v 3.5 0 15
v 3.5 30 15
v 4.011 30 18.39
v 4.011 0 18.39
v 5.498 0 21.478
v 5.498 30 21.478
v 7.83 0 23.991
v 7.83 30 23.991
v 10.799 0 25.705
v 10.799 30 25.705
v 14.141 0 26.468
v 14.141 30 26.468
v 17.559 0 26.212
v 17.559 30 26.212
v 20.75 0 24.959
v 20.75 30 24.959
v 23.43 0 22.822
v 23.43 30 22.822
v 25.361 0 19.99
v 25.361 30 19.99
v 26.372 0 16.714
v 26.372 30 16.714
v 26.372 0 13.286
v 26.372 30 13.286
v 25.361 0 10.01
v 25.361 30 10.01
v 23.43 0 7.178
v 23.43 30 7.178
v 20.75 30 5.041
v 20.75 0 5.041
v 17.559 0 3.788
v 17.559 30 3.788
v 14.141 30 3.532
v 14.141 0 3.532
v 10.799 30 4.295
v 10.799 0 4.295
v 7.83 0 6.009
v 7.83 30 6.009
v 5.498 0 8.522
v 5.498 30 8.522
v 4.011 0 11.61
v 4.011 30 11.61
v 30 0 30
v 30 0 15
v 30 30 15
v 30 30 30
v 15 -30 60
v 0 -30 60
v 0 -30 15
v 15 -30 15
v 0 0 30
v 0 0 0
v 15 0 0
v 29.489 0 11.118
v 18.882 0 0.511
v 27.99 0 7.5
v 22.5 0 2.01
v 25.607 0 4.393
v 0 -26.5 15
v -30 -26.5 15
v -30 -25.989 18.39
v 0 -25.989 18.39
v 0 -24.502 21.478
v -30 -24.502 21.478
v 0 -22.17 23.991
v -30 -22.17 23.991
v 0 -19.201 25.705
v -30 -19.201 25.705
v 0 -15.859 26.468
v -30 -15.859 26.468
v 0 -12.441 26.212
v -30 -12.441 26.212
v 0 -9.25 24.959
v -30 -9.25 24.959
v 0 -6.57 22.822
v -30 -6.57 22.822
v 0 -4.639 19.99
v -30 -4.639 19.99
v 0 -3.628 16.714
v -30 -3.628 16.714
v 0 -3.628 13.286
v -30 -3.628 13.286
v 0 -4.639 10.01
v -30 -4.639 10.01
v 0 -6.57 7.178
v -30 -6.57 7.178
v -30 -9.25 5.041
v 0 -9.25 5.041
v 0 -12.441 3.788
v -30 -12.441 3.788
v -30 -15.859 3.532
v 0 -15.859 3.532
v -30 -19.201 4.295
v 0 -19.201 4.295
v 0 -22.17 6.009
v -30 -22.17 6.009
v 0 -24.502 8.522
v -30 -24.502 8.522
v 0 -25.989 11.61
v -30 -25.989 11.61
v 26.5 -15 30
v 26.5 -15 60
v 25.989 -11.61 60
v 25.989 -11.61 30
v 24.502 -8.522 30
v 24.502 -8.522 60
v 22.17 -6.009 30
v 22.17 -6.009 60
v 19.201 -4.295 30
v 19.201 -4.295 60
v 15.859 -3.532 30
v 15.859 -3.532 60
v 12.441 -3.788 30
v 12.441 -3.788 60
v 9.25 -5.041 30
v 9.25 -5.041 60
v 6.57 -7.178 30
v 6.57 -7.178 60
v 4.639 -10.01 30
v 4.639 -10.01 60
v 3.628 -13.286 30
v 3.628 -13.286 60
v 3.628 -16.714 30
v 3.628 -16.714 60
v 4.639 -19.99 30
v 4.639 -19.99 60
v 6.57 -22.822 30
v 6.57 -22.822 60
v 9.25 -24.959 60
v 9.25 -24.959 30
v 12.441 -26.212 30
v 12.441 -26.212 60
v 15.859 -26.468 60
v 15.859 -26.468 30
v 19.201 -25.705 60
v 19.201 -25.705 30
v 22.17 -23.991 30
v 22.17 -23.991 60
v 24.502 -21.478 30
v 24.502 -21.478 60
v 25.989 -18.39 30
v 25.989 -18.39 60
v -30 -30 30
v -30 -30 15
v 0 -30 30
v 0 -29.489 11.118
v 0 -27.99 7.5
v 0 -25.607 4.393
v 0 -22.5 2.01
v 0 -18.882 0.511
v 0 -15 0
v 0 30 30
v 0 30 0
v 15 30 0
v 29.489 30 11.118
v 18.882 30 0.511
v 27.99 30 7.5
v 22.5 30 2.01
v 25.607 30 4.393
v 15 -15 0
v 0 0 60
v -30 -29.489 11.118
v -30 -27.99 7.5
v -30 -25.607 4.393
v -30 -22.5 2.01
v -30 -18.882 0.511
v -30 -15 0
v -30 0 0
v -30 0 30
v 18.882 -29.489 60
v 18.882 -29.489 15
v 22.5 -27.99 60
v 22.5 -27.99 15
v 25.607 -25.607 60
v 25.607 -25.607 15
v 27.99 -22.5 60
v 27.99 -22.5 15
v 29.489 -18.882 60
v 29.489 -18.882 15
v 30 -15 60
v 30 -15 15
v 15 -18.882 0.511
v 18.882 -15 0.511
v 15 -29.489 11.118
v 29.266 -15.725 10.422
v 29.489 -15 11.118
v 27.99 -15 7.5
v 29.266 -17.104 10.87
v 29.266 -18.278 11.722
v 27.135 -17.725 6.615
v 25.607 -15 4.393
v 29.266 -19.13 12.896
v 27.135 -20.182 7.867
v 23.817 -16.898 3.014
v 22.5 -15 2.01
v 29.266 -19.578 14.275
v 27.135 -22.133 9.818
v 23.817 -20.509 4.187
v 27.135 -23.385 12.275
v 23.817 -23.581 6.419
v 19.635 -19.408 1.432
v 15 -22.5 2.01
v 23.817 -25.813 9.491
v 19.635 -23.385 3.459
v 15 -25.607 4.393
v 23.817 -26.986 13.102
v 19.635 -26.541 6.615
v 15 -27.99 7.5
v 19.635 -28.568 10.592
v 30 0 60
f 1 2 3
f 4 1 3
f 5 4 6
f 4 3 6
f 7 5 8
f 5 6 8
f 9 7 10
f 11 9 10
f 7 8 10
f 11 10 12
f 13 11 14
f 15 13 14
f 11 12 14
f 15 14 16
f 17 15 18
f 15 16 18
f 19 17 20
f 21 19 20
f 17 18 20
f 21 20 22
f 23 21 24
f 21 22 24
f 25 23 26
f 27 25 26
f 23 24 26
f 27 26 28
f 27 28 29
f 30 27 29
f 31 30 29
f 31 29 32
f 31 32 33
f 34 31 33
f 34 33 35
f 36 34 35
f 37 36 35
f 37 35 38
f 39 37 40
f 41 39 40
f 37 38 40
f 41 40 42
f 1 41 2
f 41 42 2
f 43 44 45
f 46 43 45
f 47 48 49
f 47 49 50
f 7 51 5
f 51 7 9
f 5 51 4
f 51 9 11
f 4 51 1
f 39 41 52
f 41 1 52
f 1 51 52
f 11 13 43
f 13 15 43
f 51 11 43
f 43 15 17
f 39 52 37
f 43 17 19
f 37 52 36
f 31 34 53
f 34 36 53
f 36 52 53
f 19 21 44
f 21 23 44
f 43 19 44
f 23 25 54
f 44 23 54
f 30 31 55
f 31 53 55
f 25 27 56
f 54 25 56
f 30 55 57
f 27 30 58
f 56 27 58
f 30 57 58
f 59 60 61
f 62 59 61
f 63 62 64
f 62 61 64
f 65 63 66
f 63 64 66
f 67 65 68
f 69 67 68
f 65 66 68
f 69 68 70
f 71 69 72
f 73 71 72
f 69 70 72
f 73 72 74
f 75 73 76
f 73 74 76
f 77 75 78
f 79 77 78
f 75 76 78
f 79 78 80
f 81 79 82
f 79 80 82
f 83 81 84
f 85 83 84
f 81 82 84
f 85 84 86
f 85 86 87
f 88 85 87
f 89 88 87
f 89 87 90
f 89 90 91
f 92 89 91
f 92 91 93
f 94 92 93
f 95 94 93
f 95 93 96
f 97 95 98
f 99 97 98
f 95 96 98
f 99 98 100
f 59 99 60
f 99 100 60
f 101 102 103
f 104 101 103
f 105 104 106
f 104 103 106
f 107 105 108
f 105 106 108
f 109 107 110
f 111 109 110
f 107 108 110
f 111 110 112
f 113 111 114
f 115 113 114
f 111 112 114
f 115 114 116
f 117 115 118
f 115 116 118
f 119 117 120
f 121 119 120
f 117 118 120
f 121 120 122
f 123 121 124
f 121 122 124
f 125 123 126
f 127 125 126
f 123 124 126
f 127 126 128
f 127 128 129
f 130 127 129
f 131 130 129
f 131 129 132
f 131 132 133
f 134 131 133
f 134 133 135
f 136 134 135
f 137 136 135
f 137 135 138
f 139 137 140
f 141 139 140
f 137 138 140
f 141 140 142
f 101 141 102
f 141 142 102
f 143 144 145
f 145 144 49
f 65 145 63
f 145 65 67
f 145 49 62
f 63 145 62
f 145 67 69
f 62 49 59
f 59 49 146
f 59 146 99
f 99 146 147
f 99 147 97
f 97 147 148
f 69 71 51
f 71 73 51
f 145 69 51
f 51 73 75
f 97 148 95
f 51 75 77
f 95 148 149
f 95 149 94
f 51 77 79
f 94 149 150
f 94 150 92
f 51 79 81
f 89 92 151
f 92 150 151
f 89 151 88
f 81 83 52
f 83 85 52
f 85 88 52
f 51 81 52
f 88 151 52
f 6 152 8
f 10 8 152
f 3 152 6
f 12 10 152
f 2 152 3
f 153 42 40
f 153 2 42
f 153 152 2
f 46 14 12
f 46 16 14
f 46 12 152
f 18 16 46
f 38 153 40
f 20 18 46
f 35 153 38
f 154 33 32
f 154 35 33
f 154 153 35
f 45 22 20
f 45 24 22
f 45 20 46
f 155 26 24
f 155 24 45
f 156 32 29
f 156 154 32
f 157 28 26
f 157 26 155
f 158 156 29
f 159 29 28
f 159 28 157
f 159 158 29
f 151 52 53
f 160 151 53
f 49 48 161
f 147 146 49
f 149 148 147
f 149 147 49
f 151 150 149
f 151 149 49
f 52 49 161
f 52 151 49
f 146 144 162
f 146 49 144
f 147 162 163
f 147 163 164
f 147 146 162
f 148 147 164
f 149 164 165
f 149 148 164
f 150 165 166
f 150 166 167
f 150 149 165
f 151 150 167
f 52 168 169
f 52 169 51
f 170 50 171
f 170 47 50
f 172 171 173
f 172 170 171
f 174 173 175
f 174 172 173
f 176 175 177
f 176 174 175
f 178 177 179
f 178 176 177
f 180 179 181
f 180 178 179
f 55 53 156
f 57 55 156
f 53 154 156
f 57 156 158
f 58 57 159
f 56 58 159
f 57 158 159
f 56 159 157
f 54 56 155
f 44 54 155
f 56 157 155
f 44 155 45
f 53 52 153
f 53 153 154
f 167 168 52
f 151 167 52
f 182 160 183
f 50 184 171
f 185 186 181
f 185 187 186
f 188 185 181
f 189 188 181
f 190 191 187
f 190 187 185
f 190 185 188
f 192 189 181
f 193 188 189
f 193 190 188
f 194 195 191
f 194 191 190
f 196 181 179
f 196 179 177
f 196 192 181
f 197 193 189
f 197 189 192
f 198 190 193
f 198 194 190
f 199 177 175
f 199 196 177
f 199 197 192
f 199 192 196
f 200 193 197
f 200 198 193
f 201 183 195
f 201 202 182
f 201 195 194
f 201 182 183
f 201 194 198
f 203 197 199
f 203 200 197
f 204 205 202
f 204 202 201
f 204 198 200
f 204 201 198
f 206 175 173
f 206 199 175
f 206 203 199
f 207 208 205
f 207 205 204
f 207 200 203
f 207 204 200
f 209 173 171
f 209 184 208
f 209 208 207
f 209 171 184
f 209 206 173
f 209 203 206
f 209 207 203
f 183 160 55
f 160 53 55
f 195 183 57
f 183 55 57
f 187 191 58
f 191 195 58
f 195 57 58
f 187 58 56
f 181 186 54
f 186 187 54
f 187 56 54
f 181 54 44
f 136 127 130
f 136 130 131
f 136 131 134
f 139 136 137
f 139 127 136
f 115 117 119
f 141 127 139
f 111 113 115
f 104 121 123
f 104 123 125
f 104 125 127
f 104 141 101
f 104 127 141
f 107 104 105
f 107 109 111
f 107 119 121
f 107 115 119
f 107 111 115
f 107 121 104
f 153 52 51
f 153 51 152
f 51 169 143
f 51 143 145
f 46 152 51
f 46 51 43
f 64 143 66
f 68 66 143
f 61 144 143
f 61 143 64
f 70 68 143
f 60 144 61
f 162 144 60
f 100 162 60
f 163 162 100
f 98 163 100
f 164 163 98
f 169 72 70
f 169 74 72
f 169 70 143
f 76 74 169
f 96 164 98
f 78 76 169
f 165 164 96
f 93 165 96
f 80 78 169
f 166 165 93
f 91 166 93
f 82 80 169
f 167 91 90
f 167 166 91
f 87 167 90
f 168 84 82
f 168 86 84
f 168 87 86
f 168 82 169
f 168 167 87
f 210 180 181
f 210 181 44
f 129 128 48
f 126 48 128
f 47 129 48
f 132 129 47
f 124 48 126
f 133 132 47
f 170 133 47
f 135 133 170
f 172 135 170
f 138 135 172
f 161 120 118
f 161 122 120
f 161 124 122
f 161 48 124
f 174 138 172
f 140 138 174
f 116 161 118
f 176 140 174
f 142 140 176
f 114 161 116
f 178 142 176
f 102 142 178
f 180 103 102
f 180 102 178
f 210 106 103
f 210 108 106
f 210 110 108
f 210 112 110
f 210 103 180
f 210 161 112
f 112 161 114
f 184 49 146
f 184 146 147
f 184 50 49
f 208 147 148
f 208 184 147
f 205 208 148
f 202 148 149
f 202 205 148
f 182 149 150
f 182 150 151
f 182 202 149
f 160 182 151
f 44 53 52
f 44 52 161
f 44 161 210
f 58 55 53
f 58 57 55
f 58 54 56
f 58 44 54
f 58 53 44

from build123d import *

# Parameters (mm, degrees)
F0_W     = 30
F0_H     = 30
F1_DEPTH = 30
F2_DEPTH = 60
F4_R     = 11.5
F6_DEPTH = 30
F5_R     = 11.5
F7_DEPTH = 30
F3_R     = 11.5
F8_DEPTH = 30
F9_R     = 15
F9_2_R   = 15
F9_3_R   = 15


with BuildPart() as f1:
    # F0 (on Top) → F1 (new body)
    with BuildSketch(Plane.XY):
        with Locations((-15, -15)):
            Rectangle(F0_W, F0_H)
    extrude(amount=F1_DEPTH)

    # F5 (on face) → F7 (cut)
    with BuildSketch(Plane(origin=(-30, 0, 0), x_dir=(0, -1, 0), z_dir=(-1, 0, 0))):
        with Locations((15, 15)):
            Circle(F5_R)
    extrude(amount=-F7_DEPTH, mode=Mode.SUBTRACT)

    # F9#2
    f9_2_edges = [f1.edges().sort_by_distance(p)[0] for p in [
        (-15, -30, 0),
    ]]
    fillet(f9_2_edges, radius=F9_2_R)


with BuildPart() as f1b:
    # F0 (on Top) → F1, piece 2 (new body)
    with BuildSketch(Plane.XY):
        with Locations((15, 15)):
            Rectangle(F0_W, F0_H)
    extrude(amount=F1_DEPTH)

    # F4 (on face) → F6 (cut)
    with BuildSketch(Plane(origin=(0, 30, 0), x_dir=(-1, 0, 0), z_dir=(0, 1, 0))):
        with Locations((-15, 15)):
            Circle(F4_R)
    extrude(amount=-F6_DEPTH, mode=Mode.SUBTRACT)

    # F9#3
    f9_3_edges = [f1b.edges().sort_by_distance(p)[0] for p in [
        (30, 15, 0),
    ]]
    fillet(f9_3_edges, radius=F9_3_R)


with BuildPart() as f2:
    # F0 (on Top) → F2 (new body)
    with BuildSketch(Plane.XY):
        with Locations((15, -15)):
            Rectangle(F0_W, F0_H)
    extrude(amount=F2_DEPTH)

    # F3 (on face) → F8 (cut)
    with BuildSketch(Plane.XY.offset(60)):
        with Locations((15, -15)):
            Circle(F3_R)
    extrude(amount=-F8_DEPTH, mode=Mode.SUBTRACT)

    # F9
    f9_edges = [f2.edges().sort_by_distance(p)[0] for p in [
        (15, -30, 0),
        (30, -15, 0),
        (30, -30, 30),
    ]]
    fillet(f9_edges, radius=F9_R)


solid = Compound([f1.part, f1b.part, f2.part])
